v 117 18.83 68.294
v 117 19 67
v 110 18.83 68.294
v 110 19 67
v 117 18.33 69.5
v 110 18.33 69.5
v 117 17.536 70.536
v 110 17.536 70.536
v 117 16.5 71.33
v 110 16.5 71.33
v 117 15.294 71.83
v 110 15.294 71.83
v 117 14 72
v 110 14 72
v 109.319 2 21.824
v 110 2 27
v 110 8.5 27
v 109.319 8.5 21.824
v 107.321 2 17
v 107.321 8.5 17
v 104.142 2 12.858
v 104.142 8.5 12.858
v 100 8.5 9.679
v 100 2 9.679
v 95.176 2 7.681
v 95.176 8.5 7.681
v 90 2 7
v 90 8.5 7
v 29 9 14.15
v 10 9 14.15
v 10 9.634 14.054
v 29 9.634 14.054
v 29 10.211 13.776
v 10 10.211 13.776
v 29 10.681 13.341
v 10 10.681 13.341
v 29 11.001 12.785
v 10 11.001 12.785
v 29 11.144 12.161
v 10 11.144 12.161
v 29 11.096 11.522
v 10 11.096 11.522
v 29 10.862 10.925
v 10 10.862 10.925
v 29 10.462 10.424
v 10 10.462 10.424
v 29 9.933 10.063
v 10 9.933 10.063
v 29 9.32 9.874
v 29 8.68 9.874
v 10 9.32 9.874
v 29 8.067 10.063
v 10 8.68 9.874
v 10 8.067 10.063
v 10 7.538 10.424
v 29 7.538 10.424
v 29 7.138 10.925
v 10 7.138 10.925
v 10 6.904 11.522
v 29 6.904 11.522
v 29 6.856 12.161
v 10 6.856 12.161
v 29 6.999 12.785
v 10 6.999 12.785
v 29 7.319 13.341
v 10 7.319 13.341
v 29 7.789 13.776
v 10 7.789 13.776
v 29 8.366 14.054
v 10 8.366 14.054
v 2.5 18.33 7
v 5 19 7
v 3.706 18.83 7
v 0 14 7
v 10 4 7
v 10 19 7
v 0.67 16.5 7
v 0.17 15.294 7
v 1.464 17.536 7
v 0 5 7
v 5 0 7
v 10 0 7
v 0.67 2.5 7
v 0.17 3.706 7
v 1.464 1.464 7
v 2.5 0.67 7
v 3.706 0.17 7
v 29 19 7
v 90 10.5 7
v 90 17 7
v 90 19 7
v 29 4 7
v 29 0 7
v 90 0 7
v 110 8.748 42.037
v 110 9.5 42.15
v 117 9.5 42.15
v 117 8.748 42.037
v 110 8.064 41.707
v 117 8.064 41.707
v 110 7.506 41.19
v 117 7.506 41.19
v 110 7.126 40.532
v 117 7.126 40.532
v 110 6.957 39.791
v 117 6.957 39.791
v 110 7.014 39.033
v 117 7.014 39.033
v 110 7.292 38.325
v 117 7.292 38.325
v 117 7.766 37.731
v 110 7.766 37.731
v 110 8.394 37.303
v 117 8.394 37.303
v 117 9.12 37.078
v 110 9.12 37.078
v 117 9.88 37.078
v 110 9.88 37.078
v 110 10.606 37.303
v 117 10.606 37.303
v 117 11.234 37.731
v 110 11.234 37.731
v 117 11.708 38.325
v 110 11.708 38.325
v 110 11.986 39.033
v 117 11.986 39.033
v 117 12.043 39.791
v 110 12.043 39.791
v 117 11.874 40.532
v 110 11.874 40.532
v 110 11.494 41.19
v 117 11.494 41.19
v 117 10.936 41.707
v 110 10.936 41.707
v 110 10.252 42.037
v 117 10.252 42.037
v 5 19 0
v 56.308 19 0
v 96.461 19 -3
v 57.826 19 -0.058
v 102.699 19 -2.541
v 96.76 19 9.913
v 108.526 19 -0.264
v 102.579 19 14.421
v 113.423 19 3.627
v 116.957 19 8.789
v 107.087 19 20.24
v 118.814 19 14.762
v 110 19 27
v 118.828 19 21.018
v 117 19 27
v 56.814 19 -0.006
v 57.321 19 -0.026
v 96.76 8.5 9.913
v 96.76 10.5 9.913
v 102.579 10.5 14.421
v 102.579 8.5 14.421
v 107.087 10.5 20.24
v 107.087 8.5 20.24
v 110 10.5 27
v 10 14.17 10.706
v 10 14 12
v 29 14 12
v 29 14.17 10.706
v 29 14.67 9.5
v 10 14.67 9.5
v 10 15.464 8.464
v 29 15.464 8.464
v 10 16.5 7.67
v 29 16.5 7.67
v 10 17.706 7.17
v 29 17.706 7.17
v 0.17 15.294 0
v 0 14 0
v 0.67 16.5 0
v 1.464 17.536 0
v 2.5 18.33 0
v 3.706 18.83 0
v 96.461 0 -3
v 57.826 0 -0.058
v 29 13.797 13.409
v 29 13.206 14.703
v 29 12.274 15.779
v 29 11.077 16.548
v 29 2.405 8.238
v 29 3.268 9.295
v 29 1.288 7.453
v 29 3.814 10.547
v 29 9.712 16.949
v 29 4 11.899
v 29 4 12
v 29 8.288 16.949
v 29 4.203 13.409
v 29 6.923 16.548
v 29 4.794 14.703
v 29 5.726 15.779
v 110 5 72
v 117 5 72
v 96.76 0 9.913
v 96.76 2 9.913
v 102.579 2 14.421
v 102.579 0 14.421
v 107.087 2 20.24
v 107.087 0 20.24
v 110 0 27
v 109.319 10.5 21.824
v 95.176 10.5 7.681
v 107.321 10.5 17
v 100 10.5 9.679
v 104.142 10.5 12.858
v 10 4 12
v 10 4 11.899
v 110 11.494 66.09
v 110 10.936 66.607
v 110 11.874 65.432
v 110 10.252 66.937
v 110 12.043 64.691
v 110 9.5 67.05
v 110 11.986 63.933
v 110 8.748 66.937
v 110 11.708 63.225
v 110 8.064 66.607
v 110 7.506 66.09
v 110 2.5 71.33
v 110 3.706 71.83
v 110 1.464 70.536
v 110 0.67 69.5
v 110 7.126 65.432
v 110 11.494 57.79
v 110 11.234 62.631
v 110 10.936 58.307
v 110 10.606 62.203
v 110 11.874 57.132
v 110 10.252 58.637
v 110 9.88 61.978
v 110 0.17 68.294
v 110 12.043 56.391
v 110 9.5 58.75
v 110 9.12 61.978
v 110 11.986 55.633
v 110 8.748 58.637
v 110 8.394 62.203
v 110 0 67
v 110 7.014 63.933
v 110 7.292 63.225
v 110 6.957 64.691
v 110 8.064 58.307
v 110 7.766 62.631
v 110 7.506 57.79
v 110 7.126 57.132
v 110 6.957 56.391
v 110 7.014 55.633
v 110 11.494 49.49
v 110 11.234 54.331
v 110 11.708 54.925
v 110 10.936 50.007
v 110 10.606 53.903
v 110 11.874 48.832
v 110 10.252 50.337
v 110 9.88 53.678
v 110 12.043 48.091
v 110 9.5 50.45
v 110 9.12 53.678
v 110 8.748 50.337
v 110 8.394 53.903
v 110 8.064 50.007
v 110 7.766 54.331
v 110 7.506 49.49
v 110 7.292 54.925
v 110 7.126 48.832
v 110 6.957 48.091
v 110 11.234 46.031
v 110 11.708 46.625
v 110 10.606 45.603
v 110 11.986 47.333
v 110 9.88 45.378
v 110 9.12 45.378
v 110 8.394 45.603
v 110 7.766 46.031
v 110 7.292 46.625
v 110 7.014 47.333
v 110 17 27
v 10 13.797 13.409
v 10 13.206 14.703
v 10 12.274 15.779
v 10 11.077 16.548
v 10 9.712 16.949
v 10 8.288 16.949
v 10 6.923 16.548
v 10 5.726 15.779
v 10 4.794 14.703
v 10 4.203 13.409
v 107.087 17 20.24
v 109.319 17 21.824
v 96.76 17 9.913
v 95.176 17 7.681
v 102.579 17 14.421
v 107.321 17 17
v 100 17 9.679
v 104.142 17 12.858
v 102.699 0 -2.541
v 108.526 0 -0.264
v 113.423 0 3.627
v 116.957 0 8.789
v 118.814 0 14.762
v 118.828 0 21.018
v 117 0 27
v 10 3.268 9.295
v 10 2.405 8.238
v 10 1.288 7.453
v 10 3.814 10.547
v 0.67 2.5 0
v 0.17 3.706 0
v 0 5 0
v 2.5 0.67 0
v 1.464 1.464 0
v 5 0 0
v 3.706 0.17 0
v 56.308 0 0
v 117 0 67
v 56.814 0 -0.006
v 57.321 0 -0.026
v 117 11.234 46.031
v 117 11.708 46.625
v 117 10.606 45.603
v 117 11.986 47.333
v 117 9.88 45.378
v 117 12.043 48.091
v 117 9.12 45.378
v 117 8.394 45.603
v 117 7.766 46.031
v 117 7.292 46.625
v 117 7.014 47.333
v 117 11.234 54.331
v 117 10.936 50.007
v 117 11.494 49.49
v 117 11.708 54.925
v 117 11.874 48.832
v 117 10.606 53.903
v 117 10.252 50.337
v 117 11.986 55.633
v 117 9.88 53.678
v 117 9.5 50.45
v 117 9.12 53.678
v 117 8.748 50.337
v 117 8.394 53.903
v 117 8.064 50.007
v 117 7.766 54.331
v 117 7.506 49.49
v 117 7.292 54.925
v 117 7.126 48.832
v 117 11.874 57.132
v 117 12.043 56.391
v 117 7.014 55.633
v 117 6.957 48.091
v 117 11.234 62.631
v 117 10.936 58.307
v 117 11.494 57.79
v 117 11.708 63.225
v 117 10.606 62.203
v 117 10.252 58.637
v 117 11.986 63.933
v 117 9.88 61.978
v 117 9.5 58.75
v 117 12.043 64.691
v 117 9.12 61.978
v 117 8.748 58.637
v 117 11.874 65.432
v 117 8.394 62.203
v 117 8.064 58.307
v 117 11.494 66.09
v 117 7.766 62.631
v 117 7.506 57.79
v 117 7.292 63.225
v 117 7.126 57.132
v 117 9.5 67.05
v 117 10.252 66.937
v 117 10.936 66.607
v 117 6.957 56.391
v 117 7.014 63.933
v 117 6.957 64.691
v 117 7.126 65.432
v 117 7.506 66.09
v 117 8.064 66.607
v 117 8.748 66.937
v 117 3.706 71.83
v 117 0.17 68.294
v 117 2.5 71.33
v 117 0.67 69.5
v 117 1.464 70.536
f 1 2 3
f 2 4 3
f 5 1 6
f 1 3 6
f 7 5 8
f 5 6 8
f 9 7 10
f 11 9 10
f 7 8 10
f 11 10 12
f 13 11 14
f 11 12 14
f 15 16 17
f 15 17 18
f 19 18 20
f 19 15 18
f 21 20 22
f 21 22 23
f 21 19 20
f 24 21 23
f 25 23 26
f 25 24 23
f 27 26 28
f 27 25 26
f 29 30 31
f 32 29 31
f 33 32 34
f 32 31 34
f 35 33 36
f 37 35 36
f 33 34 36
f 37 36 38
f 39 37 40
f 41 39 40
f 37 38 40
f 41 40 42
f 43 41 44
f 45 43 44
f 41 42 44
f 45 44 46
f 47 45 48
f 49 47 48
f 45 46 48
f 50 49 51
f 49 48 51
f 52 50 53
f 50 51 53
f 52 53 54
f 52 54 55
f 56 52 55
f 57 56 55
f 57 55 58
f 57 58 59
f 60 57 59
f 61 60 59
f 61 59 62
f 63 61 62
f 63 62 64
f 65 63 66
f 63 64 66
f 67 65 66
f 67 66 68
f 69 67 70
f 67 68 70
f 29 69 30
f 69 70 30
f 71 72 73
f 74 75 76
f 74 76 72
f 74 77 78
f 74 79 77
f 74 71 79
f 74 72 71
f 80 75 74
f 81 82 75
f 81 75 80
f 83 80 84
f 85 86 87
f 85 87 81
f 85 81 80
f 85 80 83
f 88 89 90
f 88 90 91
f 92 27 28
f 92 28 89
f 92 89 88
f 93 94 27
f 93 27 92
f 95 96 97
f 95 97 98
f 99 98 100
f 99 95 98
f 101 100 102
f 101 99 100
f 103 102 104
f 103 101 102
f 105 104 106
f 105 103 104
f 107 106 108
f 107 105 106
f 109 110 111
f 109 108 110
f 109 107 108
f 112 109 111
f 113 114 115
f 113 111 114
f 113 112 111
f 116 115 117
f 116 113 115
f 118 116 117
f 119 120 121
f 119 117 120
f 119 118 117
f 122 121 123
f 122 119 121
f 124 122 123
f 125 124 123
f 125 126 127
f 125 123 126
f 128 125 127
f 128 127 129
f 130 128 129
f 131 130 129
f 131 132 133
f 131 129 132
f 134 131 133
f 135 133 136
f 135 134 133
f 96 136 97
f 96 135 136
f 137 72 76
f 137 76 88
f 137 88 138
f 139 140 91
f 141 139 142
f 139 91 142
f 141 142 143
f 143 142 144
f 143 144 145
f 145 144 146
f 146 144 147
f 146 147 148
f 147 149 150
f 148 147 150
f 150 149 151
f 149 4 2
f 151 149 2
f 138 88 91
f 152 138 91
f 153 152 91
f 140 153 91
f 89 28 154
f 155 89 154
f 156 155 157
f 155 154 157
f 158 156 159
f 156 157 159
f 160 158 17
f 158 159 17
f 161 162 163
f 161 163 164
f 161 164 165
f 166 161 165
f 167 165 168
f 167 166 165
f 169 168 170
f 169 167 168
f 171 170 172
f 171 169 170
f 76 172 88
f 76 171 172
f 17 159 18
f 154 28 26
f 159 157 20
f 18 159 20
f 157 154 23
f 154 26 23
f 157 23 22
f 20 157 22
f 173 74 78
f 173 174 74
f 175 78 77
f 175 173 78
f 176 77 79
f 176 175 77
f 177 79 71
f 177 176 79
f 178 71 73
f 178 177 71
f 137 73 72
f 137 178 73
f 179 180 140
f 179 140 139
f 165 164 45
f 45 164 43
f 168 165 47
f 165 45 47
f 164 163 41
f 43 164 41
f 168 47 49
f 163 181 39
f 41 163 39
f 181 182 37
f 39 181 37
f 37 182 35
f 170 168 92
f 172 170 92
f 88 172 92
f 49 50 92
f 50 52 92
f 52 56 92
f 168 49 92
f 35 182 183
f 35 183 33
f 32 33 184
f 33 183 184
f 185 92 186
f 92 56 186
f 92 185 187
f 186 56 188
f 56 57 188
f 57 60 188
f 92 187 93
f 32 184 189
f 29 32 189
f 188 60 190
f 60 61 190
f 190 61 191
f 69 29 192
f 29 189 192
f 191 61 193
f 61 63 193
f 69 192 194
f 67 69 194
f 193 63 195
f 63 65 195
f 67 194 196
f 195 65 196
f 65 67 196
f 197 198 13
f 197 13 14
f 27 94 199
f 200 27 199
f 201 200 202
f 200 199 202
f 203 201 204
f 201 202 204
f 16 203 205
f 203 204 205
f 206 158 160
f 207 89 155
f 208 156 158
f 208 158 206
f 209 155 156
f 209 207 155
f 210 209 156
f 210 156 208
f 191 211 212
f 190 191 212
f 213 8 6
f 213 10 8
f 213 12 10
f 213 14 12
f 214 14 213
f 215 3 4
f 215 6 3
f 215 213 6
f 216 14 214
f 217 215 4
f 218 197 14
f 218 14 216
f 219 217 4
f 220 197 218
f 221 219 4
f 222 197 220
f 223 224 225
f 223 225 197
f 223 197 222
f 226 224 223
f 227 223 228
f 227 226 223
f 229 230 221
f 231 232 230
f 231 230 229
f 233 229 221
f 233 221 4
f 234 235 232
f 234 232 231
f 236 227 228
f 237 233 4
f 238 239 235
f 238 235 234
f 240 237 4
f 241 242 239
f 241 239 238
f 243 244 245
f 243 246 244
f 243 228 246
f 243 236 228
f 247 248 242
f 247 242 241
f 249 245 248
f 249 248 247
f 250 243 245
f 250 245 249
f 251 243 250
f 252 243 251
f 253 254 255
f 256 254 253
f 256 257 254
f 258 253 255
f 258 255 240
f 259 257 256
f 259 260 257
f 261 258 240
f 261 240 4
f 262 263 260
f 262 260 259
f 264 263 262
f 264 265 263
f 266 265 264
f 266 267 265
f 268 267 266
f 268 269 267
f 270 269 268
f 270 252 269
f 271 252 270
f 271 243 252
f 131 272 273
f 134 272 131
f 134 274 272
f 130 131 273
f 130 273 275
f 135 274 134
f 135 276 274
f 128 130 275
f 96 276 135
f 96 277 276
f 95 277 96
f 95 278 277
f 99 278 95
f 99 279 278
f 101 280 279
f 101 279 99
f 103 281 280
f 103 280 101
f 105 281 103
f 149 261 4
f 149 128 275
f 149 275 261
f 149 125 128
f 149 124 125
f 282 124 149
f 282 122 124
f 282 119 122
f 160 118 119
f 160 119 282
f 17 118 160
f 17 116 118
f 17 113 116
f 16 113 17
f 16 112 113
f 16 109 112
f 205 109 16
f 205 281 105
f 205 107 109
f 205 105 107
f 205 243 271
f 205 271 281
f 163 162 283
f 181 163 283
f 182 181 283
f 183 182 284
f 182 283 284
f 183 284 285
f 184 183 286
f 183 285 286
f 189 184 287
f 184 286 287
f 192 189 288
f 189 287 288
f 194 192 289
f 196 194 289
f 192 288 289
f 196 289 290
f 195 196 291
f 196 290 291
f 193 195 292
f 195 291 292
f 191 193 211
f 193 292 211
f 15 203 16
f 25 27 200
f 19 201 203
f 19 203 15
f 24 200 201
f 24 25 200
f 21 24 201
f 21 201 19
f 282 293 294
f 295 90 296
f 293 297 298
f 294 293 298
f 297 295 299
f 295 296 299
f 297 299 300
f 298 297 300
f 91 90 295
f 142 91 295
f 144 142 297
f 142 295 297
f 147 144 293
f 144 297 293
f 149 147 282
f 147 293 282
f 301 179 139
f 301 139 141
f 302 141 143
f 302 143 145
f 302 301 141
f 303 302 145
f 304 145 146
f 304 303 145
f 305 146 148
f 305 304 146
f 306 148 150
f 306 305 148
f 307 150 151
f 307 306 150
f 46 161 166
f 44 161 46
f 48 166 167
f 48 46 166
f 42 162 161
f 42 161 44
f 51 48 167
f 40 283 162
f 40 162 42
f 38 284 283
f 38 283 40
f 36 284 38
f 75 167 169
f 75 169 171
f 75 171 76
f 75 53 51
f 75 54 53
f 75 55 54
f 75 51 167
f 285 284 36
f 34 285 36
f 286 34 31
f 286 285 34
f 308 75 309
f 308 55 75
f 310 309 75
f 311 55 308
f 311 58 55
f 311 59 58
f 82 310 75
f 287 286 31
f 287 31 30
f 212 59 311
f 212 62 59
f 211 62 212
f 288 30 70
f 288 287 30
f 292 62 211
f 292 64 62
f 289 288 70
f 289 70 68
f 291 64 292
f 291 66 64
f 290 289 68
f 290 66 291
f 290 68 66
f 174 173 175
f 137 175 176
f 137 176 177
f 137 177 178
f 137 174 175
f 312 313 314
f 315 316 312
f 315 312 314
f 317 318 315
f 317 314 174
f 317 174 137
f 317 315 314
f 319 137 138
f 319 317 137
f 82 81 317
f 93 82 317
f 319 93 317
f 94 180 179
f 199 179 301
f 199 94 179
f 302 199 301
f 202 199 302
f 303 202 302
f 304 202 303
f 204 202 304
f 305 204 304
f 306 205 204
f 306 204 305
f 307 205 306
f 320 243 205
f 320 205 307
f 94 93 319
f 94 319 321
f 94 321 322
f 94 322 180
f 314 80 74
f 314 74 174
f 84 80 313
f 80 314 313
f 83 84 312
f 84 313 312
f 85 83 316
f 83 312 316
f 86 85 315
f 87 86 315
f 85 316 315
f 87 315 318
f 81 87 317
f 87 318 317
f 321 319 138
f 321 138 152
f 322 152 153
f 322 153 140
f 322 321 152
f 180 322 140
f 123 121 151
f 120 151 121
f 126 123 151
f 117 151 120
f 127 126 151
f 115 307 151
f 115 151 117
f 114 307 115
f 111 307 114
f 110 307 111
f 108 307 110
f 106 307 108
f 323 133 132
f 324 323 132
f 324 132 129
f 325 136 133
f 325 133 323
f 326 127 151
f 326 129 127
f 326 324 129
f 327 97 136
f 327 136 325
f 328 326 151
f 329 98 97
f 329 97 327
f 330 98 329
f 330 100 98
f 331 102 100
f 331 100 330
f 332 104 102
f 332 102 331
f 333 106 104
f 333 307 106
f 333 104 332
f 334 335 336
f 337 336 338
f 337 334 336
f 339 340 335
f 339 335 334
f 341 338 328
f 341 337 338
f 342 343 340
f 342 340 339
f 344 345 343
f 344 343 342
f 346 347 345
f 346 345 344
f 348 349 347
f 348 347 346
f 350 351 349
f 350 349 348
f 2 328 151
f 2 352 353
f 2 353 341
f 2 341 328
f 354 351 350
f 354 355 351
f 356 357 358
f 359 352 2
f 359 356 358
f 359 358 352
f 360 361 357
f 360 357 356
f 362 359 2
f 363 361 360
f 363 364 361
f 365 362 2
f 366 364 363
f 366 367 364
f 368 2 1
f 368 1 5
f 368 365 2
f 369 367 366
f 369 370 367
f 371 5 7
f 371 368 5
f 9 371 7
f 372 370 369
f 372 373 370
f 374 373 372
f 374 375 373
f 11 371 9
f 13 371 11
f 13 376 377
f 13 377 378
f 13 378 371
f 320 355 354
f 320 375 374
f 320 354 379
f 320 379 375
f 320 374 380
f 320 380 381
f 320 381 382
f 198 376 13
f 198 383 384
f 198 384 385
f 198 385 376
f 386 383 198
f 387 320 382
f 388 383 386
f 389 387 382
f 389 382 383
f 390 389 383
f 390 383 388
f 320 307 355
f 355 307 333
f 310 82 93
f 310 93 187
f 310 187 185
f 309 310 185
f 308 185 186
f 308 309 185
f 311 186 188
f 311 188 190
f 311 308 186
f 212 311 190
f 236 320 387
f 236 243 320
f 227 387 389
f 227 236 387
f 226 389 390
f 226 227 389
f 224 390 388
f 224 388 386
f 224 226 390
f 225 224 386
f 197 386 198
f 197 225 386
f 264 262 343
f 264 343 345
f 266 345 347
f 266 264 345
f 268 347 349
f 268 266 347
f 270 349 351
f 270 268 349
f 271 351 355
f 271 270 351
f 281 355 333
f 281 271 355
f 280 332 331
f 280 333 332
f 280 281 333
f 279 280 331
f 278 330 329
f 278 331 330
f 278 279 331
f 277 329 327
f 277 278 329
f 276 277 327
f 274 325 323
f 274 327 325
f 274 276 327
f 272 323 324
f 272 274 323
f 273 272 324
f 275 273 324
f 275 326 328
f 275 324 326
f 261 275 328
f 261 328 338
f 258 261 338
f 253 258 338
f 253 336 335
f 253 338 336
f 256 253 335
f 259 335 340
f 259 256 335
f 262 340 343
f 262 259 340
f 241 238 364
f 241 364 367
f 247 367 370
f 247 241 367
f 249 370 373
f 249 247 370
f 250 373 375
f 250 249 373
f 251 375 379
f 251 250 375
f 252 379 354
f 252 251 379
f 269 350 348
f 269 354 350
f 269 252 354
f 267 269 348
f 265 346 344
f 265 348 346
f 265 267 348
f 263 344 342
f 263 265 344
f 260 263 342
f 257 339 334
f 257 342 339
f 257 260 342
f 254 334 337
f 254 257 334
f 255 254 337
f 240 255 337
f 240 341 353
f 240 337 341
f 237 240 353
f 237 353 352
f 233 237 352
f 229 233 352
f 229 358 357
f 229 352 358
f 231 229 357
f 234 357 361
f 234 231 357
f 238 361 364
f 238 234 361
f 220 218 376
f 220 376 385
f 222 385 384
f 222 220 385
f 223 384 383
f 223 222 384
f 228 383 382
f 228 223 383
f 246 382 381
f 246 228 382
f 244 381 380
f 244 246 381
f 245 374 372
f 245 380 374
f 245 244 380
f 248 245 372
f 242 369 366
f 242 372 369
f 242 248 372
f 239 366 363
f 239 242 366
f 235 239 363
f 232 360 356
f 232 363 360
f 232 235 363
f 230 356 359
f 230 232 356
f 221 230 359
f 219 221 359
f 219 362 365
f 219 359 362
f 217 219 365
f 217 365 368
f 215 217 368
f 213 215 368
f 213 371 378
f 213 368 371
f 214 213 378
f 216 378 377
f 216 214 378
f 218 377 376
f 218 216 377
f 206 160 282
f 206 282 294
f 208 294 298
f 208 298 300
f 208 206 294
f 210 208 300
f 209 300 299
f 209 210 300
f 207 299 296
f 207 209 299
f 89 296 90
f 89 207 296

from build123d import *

# Parameters (mm, degrees)
BOSS_EXTRUDE1_DEPTH = 19
SKETCH4_R           = 2.55
CUT_EXTRUDE1_DEPTH  = 139.686697271
LPATTERN1_COUNT     = 4
LPATTERN1_PITCH     = 8.3
FILLET2_R           = 5
BOSS_EXTRUDE4_DEPTH = 19
BOSS_EXTRUDE5_DEPTH = 2
LPATTERN3_COUNT     = 3
LPATTERN3_PITCH     = 8.5
FILLET4_R           = 20
SKETCH9_R           = 2.15
BOSS_EXTRUDE6_DEPTH = 19
FILLET5_R           = 5


with BuildPart() as part:
    # Sketch1 → Boss-Extrude1 (new body)
    with BuildSketch(Plane(origin=(0, 0, 0), x_dir=(1, 0, 0), z_dir=(0, 1, 0))):
        with BuildLine():
            Line((0, 0), (90, 0))
            ThreePointArc((90, 0), (109.091883092, -7.908116908), (117, -27))
            Line((117, -27), (117, -72))
            Line((117, -72), (110, -72))
            Line((110, -72), (110, -27))
            ThreePointArc((110, -27), (104.142135624, -12.857864376), (90, -7))
            Line((90, -7), (0, -7))
            Line((0, -7), (0, 0))
        make_face()
    extrude(amount=BOSS_EXTRUDE1_DEPTH)

    # Sketch4 → Cut-Extrude1 (cut, through all)
    with BuildSketch(Plane(origin=(0, 0, 0), x_dir=(0, 0, -1), z_dir=(1, 0, 0))):
        with Locations(Location((-64.5, 9.5, 0), (0, 0, 180))):
            Circle(SKETCH4_R)
    cut_extrude1 = extrude(amount=CUT_EXTRUDE1_DEPTH, mode=Mode.SUBTRACT)

    # LPattern1: Cut-Extrude1 ×4
    with Locations(*[(0, 0, -i * LPATTERN1_PITCH) for i in range(1, LPATTERN1_COUNT)]):
        add(cut_extrude1, mode=Mode.SUBTRACT)

    # Fillet2
    fillet2_edges = [part.edges().sort_by_distance(p)[0] for p in [
        (0, 0, 3.5),
        (113.5, 19, 72),
        (0, 19, 3.5),
        (113.5, 0, 72),
    ]]
    fillet(fillet2_edges, radius=FILLET2_R)

    # Sketch6 → Boss-Extrude4 (add)
    with BuildSketch(Plane(origin=(0, 0, 0), x_dir=(1, 0, 0), z_dir=(0, 1, 0))):
        with BuildLine():
            Line((57.067989457, 0), (96.460545107, 3))
            ThreePointArc((96.460545107, 3), (115.383129249, -6.075834674), (117, -27))
            ThreePointArc((117, -27), (109.091883092, -7.908116908), (90, 0))
            Line((90, 0), (57.067989457, 0))
        make_face()
    extrude(amount=BOSS_EXTRUDE4_DEPTH)

    # Sketch8 → Boss-Extrude5 (add)
    with BuildSketch(Plane(origin=(0, 0, 0), x_dir=(1, 0, 0), z_dir=(0, 1, 0))):
        with BuildLine():
            ThreePointArc((90, -7), (102.578584062, -14.421415938), (110, -27))
            ThreePointArc((110, -27), (104.142135624, -12.857864376), (90, -7))
        make_face()
    boss_extrude5 = extrude(amount=BOSS_EXTRUDE5_DEPTH)

    # LPattern3: Boss-Extrude5 ×3
    with Locations(*[(0, i * LPATTERN3_PITCH, 0) for i in range(1, LPATTERN3_COUNT)]):
        add(boss_extrude5)

    # Fillet4
    # the kernel refuses this fillet: 20 mm, written as the material it adds along each edge
    with BuildSketch(Plane(origin=(57.067989457, 0, 0), x_dir=(-1, 0, 0), z_dir=(0, 1, 0))) as fillet4_piece_1:
        with BuildLine():
            CenterArc((FILLET4_R * 0.0380232084134, -FILLET4_R), FILLET4_R, 90, 4.355040752)
            Line((-FILLET4_R * 0.0379134219382, -FILLET4_R * 0.00288735432207), (0, 0))
            Line((0, 0), (FILLET4_R * 0.0380232084134, 0))
        make_face()
    extrude(amount=19)

    # Sketch9 → Boss-Extrude6 (add)
    with BuildSketch(Plane.ZY.offset(-10)):
        with BuildLine():
            Line((7, 14), (12, 14))
            ThreePointArc((12, 14), (17, 9), (12, 4))
            Line((12, 4), (7, 4))
            Line((7, 4), (7, 14))
        make_face()
        with Locations((12, 9)):
            Circle(SKETCH9_R, mode=Mode.SUBTRACT)
    extrude(amount=-BOSS_EXTRUDE6_DEPTH)

    # Fillet5
    # the kernel refuses this fillet: 5 mm, written as the material it adds along each edge
    with BuildSketch(Plane(origin=(10, 4, 7), x_dir=(0, -1.0, 1.5822898546952626e-12), z_dir=(1, 0, 0))) as fillet5_piece_1:
        with BuildLine():
            CenterArc((5, -4.898979486), FILLET5_R, 101.536959033, 78.463040967)
            Line((0, -4.898979486), (0, 0))
            Line((0, 0), (4, 0))
        make_face()
    extrude(amount=19)
    with BuildSketch(Plane(origin=(10, 14, 7), x_dir=(0, 1, 0), z_dir=(1, 0, 0))) as fillet5_piece_2:
        with BuildLine():
            CenterArc((FILLET5_R, FILLET5_R), FILLET5_R, 180, 90)
            Line((0, FILLET5_R), (0, 0))
            Line((0, 0), (FILLET5_R, 0))
        make_face()
    extrude(amount=19)


solid = part.part
